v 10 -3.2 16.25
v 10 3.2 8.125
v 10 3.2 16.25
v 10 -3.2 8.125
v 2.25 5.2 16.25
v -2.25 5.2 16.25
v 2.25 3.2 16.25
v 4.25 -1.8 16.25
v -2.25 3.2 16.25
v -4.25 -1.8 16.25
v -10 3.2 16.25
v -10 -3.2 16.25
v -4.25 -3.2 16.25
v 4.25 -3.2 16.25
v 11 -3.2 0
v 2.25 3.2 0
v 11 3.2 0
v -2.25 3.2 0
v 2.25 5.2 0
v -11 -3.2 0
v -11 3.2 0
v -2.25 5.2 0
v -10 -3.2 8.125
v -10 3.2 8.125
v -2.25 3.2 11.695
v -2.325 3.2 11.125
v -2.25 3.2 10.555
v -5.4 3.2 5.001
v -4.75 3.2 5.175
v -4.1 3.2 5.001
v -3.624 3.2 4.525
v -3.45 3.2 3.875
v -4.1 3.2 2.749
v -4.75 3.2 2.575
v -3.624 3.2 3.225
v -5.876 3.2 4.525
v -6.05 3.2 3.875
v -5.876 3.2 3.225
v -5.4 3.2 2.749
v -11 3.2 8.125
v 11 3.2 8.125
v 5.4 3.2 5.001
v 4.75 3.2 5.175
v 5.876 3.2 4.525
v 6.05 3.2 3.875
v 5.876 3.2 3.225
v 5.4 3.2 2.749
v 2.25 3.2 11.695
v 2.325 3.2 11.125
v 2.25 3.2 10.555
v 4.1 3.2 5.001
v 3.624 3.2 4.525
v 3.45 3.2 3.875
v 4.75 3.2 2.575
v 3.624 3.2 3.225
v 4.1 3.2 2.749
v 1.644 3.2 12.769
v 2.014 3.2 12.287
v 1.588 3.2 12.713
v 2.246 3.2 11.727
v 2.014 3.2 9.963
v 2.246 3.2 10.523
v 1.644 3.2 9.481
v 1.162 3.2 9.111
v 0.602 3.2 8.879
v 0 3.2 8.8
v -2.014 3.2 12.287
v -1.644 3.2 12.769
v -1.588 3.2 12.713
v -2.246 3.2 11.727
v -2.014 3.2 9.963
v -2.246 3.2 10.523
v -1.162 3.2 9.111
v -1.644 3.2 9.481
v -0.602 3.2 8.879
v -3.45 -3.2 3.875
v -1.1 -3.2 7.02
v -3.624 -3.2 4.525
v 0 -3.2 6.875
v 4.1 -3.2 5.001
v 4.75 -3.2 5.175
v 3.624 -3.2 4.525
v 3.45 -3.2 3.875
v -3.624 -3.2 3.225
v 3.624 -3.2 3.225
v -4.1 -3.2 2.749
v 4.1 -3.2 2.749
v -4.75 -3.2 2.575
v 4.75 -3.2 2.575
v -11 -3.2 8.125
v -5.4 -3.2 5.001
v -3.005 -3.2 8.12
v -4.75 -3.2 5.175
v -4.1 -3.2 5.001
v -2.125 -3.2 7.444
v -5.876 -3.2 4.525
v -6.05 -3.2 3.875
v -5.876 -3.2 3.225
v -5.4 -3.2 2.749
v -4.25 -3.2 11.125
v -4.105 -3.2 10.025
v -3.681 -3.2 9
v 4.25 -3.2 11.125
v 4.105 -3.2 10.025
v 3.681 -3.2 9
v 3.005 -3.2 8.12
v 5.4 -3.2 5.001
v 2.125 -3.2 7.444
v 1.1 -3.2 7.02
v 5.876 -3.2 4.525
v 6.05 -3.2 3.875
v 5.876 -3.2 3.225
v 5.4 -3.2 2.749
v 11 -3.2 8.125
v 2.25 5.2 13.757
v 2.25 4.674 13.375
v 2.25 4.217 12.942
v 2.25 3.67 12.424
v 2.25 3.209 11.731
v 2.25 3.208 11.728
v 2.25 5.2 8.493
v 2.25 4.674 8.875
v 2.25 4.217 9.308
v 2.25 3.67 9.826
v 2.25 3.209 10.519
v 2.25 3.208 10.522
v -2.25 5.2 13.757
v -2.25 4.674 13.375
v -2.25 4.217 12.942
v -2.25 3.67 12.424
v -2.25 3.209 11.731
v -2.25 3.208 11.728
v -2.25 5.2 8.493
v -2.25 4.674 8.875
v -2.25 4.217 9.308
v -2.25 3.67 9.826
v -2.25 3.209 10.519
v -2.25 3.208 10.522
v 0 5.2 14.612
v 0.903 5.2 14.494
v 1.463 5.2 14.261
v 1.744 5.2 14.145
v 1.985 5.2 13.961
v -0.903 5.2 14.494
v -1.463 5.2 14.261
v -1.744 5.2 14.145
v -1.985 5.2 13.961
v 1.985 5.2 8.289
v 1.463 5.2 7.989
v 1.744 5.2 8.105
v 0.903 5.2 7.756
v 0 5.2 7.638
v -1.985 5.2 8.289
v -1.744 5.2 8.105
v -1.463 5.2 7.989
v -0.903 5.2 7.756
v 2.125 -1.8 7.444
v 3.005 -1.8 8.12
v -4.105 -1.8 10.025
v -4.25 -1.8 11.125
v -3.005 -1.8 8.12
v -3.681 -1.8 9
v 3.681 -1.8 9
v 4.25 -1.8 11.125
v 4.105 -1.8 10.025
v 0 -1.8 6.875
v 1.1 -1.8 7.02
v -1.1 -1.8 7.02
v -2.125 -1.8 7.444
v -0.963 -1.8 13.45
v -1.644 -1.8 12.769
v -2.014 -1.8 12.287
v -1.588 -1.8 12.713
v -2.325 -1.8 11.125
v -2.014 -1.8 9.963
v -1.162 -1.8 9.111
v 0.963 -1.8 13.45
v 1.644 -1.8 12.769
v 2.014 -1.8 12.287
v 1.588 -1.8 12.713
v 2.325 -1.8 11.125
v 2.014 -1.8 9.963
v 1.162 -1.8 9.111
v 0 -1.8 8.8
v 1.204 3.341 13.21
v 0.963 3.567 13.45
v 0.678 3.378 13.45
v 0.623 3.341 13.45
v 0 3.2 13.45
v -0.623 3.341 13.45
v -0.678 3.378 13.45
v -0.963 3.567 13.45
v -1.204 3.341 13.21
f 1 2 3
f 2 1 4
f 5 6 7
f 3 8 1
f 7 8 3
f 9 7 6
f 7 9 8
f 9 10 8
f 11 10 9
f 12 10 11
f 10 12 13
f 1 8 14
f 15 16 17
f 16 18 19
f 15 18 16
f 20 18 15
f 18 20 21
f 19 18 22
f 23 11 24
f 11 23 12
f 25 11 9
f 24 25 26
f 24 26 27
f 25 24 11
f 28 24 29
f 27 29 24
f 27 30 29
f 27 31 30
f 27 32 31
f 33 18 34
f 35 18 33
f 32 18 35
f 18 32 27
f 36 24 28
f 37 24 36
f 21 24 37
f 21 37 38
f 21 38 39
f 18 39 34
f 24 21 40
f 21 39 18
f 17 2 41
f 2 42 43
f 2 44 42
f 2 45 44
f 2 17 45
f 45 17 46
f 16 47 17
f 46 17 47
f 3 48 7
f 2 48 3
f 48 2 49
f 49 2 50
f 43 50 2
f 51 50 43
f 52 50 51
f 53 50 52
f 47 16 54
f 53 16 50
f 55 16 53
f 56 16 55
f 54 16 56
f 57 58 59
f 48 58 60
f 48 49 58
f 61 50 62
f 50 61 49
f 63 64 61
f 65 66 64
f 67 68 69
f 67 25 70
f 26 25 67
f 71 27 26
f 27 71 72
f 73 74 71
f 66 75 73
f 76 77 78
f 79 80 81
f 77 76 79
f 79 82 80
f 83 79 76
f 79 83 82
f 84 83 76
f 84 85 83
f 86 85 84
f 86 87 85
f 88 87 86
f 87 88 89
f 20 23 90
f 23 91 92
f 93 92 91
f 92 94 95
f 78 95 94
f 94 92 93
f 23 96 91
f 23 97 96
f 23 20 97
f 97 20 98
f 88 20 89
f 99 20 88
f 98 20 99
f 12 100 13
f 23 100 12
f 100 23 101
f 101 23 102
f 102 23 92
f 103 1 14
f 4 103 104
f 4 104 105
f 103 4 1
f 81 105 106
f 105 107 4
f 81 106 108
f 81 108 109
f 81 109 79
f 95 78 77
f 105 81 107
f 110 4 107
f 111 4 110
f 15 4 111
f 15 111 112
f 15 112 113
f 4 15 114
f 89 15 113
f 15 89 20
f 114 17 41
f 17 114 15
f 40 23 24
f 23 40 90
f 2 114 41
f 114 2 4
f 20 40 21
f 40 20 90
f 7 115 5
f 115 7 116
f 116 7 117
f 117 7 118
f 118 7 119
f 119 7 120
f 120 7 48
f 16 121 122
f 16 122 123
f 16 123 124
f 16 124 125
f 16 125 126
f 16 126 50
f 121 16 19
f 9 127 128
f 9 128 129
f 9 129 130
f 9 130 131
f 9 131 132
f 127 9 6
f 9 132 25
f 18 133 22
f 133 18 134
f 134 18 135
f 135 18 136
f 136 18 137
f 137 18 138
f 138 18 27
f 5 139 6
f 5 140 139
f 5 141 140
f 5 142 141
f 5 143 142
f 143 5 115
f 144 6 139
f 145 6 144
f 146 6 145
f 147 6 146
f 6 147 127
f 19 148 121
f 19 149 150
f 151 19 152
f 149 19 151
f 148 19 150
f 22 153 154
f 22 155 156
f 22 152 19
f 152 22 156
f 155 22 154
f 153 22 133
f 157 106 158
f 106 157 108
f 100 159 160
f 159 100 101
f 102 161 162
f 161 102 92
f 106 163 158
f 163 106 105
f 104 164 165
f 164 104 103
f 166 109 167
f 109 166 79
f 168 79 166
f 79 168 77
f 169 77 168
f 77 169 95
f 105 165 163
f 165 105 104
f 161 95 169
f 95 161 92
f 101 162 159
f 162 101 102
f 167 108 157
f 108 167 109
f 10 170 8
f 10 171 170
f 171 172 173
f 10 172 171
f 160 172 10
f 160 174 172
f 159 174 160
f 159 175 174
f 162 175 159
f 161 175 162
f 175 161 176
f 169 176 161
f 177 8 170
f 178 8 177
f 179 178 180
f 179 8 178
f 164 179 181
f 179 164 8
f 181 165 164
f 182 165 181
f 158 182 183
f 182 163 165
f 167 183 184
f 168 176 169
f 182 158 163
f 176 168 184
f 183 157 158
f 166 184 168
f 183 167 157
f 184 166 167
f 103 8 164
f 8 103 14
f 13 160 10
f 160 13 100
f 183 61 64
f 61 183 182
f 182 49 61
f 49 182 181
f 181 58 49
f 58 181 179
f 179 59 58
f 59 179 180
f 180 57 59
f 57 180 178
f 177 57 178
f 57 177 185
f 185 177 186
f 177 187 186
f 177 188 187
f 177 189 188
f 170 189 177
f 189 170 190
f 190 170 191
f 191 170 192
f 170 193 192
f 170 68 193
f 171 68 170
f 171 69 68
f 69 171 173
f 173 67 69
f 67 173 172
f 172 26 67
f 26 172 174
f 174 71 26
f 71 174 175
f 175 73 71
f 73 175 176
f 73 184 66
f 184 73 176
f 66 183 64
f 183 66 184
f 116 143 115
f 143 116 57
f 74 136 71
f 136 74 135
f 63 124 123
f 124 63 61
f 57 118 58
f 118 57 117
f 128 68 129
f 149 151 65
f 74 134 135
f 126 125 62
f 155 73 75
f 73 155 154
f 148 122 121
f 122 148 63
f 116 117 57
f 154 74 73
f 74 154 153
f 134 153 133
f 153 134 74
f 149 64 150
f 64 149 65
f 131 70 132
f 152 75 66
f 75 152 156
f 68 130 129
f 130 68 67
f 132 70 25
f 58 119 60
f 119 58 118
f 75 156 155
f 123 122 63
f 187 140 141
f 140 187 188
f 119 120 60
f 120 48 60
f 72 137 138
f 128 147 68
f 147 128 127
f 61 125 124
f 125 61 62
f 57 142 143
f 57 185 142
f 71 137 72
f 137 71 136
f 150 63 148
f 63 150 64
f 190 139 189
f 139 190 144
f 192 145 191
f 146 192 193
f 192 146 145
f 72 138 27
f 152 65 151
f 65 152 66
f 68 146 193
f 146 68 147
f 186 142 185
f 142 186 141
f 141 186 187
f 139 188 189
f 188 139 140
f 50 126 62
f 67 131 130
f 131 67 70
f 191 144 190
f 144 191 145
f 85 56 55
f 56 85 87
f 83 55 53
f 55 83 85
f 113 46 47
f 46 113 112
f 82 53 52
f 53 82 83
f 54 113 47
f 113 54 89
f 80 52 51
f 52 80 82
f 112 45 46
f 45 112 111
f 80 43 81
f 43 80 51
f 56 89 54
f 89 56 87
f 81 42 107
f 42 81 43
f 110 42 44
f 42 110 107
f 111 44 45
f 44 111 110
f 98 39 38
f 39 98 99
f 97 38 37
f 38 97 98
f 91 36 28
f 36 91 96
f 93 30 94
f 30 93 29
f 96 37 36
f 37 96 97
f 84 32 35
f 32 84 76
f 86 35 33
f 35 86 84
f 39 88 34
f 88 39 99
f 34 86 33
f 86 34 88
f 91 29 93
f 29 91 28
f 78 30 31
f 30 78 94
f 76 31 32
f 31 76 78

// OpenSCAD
// file: ../microswitch.scad
// Don't print this file, purchase real micro switches
// (Honeywell ZM10B10A01 or similar).

module microswitch() {
  difference() {
    union() {
      translate([0, 0, 2.5])
        cube([19.8, 6, 10], center=true);
      translate([2.5, 0.5, 6])
        cube([2, 3.5, 5], center=true);
      for (x = [-8, -1, 8]) {
        translate([x, 0, 0])
          cube([0.6, 3.2, 13], center=true);
      }
    }
    for (x = [-9.5/2, 9.5/2]) {
      translate([x, 0, 0]) rotate([90, 0, 0])
        cylinder(r=2.5/2, h=20, center=true, $fn=12);
    }
  }
}

microswitch();
// file: teardrop.scad
///////////////////////////////////////////////////////////////////////////////////////////
// The teardrop functions below are from "teardrop.scad" by nophead's Mendel90 design
//
// Mendel90
//
// GNU GPL v2
// nop.head@gmail.com
// hydraraptor.blogspot.com
//
// For making horizontal holes that don't need support material
// Small holes can get away without it but they print better with truncated teardrops
//
module teardrop_2D(r, truncate = true) {
    difference() {
        union() {
            circle(r = r, center = true);
            translate([0,r / sqrt(2),0])
                rotate([0,0,45])
                    square([r, r], center = true);
        }
        if(truncate)
            translate([0, r * 2, 0])
                square([2 * r, 2 * r], center = true);
    }
}

module teardrop(h, r, center, truncate = true)
    linear_extrude(height = h, convexity = 2, center = center)
        teardrop_2D(r, truncate);

module teardrop_plus(h, r, center, truncate = true)
    teardrop(h, r + layer_height / 4, center, truncate);


module tearslot(h, r, w, center)
    linear_extrude(height = h, convexity = 6, center = center)
        hull() {
            translate([-w/2,0,0]) teardrop_2D(r, true);
            translate([ w/2,0,0]) teardrop_2D(r, true);
        }

module vertical_tearslot(h, r, l, center = true)
    linear_extrude(height = h, convexity = 6, center = center)
        hull() {
            translate([0, l / 2]) teardrop_2D(r, true);
            translate([0, -l / 2, 0])
                circle(r = r, center = true);
        }

//////////////////////////////////////////////////////////////////////////////////////
// file: ../configuration.scad
// Increase this if your slicer or printer make holes too tight.
extra_radius = 0.2;

// OpenBeam or Misumi. 15x15 mm or 20x20 mm
extrusion = 20;

// OD = outside diameter, corner to corner.
m3_nut_od = 6.1;
m3_nut_radius = m3_nut_od/2 + 0.2 + extra_radius;
m3_washer_radius = 3.5 + extra_radius;

// Major diameter of metric 3mm thread.
m3_major = 2.85;
m3_radius = m3_major/2 + extra_radius;
m3_wide_radius = m3_major/2 + extra_radius + 0.2;
m3_scs_head_clearance_radius=7/2;

// Major diameter of metric 4mm thread.
m4_major = 3.85;
m4_radius = m4_major/2 + extra_radius;
m4_wide_radius = m4_major/2 + extra_radius + 0.2;
m4_scs_head_clearance_radius=8.5/2;



//for chamfers to be added
chamfer_width=1.5;

// NEMA17 stepper motors.
motor_shaft_diameter = 5;
motor_shaft_radius = motor_shaft_diameter/2 + extra_radius;

// Frame brackets. M3x8mm screws work best with 3.6 mm brackets.
thickness = 3.6;

//extrusion specific settings

//Socket cap screws used to assemble the frame
frame_scs_radius= extrusion==15 ? m3_radius : m4_radius;
frame_scs_wide_radius= extrusion==15 ? m3_wide_radius : m4_wide_radius;
frame_scs_head_clearance_radius= extrusion==15 ? m3_scs_head_clearance_radius: m4_scs_head_clearance_radius;

//4.1 if extrusion_w=15 6.1 if extrusion_w=20
nut_t_r = extrusion==15 ? 4.1 : 6.1;

// Placement for the NEMA17 stepper motors.
motor_offset = extrusion==15 ? 44: 41.5; //44 for 15x15 49 for 20x20 with motor posn adjusted for duet
motor_length = 42;
// main file
include <../configuration.scad>;
include <teardrop.scad>

use <../microswitch.scad>;

thickness = 6.4;  // thinner endstop required for the delrin V roller version
width = extrusion;  // Same as vertical extrusion.
height = 12+frame_scs_radius*2;

echo(frame_scs_head_clearance_radius);

module endstop() {
  difference() {
    union() {
      cube([width, thickness, height], center=true);
      translate([0, 0, -height/4])
        cube([width+2, thickness, height/2], center=true);
      translate([0, 2, 0])
        cube([nut_t_r-1.6, thickness, height], center=true);
    }
    translate([0, 0, 3]) rotate([90, 0, 0]) {
      teardrop(r=frame_scs_wide_radius, h=20, center=true, $fn=12,truncate=true);
      translate([0, 0, 5]) {
        #teardrop(r=frame_scs_head_clearance_radius, h=thickness, $fn=24,truncate=true,center=true);
        translate([0, 5, 0])
          cube([frame_scs_head_clearance_radius*2, 10, thickness], center=true);
      }
      translate([0, 0, -thickness/2]) scale([1, 1, -1])
        cylinder(r1=frame_scs_wide_radius, r2=2*frame_scs_wide_radius, h=4, $fn=24);
    }
    translate([0, -3-thickness/2, -frame_scs_head_clearance_radius]) rotate([0, 180, 0]) {
      % microswitch();
      for (x = [-9.5/2, 9.5/2]) {
        translate([x, 0, 0]) rotate([90, 0, 0])
          cylinder(r=2.6/2, h=40, center=true, $fn=12);
      }
    }
  }
}

translate([0, 0, height/2]) endstop();
